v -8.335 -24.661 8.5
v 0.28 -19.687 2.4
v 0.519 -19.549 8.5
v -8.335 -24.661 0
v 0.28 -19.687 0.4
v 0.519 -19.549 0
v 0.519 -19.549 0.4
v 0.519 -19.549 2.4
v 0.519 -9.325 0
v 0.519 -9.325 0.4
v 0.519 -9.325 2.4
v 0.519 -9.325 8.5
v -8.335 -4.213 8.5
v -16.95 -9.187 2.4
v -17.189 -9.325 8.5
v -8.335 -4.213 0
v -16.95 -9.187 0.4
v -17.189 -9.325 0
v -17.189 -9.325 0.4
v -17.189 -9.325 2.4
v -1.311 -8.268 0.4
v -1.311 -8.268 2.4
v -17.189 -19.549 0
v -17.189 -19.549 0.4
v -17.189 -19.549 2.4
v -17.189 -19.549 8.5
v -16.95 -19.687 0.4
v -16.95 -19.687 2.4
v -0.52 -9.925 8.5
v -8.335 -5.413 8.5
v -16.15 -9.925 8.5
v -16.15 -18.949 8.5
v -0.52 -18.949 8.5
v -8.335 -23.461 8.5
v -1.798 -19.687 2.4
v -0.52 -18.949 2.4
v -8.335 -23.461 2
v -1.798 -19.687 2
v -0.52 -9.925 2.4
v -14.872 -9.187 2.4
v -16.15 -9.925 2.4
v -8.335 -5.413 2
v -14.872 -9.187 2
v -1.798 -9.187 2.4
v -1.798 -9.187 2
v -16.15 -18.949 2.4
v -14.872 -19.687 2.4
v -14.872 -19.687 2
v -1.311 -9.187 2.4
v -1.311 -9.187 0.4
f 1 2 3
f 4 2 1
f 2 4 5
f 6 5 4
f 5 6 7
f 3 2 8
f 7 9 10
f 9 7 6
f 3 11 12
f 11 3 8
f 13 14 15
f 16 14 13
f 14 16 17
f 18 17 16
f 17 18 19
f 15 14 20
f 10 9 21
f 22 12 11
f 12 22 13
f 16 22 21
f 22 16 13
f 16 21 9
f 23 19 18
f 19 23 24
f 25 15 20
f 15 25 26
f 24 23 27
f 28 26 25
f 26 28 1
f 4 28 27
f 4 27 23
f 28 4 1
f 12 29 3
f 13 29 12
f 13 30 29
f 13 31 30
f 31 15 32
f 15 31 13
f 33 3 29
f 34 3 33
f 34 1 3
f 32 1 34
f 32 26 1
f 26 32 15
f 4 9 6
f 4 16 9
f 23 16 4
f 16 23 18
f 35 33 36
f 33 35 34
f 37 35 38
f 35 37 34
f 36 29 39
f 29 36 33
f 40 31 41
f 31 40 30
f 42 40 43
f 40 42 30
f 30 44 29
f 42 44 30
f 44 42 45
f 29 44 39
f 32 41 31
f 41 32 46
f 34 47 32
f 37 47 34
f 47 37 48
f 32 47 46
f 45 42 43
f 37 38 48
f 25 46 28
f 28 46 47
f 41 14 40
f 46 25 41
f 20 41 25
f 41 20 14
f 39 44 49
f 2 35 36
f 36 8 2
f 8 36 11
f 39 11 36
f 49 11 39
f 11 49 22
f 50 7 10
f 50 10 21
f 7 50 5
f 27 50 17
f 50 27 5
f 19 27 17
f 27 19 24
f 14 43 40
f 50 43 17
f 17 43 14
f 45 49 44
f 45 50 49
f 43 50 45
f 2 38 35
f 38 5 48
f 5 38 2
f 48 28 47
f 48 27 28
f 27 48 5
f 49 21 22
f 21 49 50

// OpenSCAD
// ==========================================================================
// Fast-Rendering Uniform Wall HexLED Fixture - WS2812B Serpentine Grid
// Mathematical Half-Wall Offset -> Instant OpenSCAD CSG Rendering & Exact 1.2mm Walls!
// Open in OpenSCAD or FreeCAD (OpenSCAD Workbench)
// ==========================================================================

hex_radius = 9.624; // 16.67mm LED pitch
wall_thickness = 1.20; // Uniform wall thickness everywhere
fixture_height = 8.50;
base_floor = 0.40;
led_tray_height = 2.00;
strip_width = 10.50;
strip_depth = 1.60;

module hex_cell(is_right_end, is_left_end, is_even_row) {
  r_outer = hex_radius + wall_thickness/2;
  r_inner = hex_radius - wall_thickness/2;
  difference() {
    // Outer Hexagon Body
    rotate([0, 0, 30]) cylinder(r = r_outer, h = fixture_height, $fn = 6);
    // Inner Light Cavity
    translate([0, 0, led_tray_height]) rotate([0, 0, 30]) cylinder(r = r_inner, h = fixture_height + 1, $fn = 6);
    // Straight Strip Channel
    translate([-r_outer - 2, -strip_width/2, base_floor]) cube([(r_outer + 2)*2, strip_width, strip_depth + 0.4]);
    // Serpentine Turnaround Channel
    if ((is_right_end && is_even_row) || (is_left_end && !is_even_row)) {
      dir = is_right_end ? 1 : -1;
      translate([dir * (r_inner - 2), -strip_width/2, base_floor]) cube([strip_width + 4, strip_width * 1.8, strip_depth + 0.4]);
    }
  }
}

module full_fixture() {
  union() {
    translate([-8.335, -14.437, 0]) hex_cell(true, true, true);
  }
}

full_fixture();
